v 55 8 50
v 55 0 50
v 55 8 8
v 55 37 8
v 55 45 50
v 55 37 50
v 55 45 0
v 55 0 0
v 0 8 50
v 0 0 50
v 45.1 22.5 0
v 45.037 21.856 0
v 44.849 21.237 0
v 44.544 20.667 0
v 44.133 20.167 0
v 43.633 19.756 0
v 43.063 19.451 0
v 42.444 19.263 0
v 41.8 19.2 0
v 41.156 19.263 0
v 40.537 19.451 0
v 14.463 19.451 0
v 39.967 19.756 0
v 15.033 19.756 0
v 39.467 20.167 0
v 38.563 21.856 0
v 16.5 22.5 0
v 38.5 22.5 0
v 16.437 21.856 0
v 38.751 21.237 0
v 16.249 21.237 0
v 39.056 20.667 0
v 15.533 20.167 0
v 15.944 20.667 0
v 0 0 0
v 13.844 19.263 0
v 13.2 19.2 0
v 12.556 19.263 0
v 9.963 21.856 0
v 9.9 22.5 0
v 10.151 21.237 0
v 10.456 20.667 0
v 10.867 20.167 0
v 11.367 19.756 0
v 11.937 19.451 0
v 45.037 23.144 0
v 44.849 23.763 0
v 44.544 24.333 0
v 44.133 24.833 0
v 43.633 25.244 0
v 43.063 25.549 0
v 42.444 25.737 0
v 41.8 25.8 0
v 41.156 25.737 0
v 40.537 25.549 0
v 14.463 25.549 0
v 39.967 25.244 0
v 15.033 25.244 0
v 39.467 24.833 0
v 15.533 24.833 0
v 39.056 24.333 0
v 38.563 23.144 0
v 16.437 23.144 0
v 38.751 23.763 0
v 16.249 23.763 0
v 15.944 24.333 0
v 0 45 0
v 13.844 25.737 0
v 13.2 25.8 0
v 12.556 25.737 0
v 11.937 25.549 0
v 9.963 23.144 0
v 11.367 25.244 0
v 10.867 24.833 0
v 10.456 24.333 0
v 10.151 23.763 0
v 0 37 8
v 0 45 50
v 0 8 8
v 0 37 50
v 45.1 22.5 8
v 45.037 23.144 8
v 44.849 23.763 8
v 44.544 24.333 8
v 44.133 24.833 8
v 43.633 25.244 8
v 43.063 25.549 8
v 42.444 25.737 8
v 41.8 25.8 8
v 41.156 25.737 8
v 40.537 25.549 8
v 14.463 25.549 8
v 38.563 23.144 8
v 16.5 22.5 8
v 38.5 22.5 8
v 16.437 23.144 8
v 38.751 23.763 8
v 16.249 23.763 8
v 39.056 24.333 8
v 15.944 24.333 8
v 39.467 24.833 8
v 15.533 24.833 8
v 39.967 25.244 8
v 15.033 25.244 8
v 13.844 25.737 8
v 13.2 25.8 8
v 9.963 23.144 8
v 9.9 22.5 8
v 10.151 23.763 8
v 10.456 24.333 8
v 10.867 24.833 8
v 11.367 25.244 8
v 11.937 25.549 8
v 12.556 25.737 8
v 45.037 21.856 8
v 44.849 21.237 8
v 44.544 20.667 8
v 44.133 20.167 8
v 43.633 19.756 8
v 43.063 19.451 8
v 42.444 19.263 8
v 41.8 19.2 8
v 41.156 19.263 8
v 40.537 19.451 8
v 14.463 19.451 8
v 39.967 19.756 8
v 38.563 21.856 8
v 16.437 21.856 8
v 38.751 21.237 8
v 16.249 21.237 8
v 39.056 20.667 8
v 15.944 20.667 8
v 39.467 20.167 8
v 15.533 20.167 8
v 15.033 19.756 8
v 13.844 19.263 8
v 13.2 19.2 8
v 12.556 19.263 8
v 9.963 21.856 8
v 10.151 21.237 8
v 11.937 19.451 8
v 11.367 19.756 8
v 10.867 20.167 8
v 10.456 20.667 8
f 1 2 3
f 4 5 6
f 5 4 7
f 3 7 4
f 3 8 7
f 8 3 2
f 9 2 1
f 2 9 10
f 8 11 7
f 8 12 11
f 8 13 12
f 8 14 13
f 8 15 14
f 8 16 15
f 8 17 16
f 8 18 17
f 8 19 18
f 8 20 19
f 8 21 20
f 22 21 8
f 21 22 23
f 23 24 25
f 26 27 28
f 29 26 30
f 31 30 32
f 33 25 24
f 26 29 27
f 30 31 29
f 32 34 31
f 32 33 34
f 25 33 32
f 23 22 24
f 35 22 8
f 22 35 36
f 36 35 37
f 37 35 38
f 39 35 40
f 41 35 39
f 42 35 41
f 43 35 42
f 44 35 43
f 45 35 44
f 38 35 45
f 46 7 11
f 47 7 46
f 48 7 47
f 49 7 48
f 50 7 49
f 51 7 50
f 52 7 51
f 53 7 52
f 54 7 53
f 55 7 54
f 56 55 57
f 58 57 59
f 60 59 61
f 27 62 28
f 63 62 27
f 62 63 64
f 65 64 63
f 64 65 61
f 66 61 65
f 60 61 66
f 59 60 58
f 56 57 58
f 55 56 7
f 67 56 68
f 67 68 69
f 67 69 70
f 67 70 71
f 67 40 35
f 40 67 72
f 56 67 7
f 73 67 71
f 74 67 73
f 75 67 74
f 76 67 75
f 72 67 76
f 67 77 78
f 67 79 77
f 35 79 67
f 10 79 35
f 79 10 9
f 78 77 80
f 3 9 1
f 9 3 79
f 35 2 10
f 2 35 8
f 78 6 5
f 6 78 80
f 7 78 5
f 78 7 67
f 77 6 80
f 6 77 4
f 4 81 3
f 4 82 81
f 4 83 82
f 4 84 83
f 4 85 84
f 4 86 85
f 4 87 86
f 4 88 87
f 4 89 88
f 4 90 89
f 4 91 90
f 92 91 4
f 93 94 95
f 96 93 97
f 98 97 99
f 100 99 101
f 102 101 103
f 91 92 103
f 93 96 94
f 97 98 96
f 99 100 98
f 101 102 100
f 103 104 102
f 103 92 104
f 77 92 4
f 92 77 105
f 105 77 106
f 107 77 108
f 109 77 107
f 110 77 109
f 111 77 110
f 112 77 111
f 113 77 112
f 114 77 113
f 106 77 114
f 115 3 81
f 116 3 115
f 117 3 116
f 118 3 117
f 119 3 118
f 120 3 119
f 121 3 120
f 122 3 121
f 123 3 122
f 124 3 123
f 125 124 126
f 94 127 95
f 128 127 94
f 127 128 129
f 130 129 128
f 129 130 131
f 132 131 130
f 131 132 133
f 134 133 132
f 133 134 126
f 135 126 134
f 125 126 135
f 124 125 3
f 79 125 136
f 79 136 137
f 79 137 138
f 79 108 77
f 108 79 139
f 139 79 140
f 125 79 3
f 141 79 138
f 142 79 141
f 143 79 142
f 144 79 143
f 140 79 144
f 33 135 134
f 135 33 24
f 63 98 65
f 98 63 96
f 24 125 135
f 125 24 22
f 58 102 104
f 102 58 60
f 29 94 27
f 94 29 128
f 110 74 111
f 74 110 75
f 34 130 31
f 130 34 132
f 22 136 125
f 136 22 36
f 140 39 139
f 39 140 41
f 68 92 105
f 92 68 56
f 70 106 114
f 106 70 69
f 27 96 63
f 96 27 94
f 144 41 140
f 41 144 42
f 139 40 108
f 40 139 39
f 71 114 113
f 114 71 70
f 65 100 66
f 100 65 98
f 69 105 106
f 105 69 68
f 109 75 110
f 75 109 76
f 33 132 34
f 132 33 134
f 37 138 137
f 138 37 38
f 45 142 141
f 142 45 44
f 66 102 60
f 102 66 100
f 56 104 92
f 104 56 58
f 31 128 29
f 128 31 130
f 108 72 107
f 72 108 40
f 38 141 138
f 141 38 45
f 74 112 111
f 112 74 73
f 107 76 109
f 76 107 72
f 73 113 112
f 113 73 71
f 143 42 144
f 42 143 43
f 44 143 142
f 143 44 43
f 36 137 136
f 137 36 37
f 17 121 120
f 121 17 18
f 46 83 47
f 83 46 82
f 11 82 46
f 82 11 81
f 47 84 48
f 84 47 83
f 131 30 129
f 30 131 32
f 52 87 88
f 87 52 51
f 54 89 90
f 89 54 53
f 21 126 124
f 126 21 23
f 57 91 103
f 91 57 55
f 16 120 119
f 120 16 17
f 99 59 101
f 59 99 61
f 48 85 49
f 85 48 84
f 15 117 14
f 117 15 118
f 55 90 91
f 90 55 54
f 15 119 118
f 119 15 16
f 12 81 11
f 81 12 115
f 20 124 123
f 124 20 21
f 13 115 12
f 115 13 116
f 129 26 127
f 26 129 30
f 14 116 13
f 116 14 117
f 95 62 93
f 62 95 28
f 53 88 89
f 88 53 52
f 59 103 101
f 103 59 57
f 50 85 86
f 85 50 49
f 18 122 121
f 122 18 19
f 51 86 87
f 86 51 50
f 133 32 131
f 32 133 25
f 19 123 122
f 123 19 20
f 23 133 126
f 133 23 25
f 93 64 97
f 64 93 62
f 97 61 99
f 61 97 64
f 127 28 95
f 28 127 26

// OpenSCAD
$fn = 32;

// ----------------------------------------------------------------------
// U-bracket: 55 x 45 x 50 mm
// ----------------------------------------------------------------------

// --- parameters (mm) ---
rail_len = 55;            // outer length, X
jaw_w = 45;               // outer width, Y
jaw_h = 50;               // upright height, Z
web_t = 8;                // wall thickness
hole_d = 6.6;             // clearance for M6

module hole_z(px, py) {
  translate([px, py, -2.5]) cylinder(h = web_t + 5, d = hole_d);
}
module hole_y_pz(pz) {
  /* through both uprights along Y */
  translate([0, -2.5, pz]) rotate([-90, 0, 0]) cylinder(h = jaw_w + 5, d = hole_d);
}

module base() {
  cube([rail_len, jaw_w, web_t]);
}

module uprights() {
  cube([rail_len, web_t, jaw_h]);
  translate([0, jaw_w - web_t, 0]) cube([rail_len, web_t, jaw_h]);
}

difference() {
  union() {
    base();
    uprights();
  }
  hole_z(13.2, 22.5);
  hole_z(41.8, 22.5);
}
